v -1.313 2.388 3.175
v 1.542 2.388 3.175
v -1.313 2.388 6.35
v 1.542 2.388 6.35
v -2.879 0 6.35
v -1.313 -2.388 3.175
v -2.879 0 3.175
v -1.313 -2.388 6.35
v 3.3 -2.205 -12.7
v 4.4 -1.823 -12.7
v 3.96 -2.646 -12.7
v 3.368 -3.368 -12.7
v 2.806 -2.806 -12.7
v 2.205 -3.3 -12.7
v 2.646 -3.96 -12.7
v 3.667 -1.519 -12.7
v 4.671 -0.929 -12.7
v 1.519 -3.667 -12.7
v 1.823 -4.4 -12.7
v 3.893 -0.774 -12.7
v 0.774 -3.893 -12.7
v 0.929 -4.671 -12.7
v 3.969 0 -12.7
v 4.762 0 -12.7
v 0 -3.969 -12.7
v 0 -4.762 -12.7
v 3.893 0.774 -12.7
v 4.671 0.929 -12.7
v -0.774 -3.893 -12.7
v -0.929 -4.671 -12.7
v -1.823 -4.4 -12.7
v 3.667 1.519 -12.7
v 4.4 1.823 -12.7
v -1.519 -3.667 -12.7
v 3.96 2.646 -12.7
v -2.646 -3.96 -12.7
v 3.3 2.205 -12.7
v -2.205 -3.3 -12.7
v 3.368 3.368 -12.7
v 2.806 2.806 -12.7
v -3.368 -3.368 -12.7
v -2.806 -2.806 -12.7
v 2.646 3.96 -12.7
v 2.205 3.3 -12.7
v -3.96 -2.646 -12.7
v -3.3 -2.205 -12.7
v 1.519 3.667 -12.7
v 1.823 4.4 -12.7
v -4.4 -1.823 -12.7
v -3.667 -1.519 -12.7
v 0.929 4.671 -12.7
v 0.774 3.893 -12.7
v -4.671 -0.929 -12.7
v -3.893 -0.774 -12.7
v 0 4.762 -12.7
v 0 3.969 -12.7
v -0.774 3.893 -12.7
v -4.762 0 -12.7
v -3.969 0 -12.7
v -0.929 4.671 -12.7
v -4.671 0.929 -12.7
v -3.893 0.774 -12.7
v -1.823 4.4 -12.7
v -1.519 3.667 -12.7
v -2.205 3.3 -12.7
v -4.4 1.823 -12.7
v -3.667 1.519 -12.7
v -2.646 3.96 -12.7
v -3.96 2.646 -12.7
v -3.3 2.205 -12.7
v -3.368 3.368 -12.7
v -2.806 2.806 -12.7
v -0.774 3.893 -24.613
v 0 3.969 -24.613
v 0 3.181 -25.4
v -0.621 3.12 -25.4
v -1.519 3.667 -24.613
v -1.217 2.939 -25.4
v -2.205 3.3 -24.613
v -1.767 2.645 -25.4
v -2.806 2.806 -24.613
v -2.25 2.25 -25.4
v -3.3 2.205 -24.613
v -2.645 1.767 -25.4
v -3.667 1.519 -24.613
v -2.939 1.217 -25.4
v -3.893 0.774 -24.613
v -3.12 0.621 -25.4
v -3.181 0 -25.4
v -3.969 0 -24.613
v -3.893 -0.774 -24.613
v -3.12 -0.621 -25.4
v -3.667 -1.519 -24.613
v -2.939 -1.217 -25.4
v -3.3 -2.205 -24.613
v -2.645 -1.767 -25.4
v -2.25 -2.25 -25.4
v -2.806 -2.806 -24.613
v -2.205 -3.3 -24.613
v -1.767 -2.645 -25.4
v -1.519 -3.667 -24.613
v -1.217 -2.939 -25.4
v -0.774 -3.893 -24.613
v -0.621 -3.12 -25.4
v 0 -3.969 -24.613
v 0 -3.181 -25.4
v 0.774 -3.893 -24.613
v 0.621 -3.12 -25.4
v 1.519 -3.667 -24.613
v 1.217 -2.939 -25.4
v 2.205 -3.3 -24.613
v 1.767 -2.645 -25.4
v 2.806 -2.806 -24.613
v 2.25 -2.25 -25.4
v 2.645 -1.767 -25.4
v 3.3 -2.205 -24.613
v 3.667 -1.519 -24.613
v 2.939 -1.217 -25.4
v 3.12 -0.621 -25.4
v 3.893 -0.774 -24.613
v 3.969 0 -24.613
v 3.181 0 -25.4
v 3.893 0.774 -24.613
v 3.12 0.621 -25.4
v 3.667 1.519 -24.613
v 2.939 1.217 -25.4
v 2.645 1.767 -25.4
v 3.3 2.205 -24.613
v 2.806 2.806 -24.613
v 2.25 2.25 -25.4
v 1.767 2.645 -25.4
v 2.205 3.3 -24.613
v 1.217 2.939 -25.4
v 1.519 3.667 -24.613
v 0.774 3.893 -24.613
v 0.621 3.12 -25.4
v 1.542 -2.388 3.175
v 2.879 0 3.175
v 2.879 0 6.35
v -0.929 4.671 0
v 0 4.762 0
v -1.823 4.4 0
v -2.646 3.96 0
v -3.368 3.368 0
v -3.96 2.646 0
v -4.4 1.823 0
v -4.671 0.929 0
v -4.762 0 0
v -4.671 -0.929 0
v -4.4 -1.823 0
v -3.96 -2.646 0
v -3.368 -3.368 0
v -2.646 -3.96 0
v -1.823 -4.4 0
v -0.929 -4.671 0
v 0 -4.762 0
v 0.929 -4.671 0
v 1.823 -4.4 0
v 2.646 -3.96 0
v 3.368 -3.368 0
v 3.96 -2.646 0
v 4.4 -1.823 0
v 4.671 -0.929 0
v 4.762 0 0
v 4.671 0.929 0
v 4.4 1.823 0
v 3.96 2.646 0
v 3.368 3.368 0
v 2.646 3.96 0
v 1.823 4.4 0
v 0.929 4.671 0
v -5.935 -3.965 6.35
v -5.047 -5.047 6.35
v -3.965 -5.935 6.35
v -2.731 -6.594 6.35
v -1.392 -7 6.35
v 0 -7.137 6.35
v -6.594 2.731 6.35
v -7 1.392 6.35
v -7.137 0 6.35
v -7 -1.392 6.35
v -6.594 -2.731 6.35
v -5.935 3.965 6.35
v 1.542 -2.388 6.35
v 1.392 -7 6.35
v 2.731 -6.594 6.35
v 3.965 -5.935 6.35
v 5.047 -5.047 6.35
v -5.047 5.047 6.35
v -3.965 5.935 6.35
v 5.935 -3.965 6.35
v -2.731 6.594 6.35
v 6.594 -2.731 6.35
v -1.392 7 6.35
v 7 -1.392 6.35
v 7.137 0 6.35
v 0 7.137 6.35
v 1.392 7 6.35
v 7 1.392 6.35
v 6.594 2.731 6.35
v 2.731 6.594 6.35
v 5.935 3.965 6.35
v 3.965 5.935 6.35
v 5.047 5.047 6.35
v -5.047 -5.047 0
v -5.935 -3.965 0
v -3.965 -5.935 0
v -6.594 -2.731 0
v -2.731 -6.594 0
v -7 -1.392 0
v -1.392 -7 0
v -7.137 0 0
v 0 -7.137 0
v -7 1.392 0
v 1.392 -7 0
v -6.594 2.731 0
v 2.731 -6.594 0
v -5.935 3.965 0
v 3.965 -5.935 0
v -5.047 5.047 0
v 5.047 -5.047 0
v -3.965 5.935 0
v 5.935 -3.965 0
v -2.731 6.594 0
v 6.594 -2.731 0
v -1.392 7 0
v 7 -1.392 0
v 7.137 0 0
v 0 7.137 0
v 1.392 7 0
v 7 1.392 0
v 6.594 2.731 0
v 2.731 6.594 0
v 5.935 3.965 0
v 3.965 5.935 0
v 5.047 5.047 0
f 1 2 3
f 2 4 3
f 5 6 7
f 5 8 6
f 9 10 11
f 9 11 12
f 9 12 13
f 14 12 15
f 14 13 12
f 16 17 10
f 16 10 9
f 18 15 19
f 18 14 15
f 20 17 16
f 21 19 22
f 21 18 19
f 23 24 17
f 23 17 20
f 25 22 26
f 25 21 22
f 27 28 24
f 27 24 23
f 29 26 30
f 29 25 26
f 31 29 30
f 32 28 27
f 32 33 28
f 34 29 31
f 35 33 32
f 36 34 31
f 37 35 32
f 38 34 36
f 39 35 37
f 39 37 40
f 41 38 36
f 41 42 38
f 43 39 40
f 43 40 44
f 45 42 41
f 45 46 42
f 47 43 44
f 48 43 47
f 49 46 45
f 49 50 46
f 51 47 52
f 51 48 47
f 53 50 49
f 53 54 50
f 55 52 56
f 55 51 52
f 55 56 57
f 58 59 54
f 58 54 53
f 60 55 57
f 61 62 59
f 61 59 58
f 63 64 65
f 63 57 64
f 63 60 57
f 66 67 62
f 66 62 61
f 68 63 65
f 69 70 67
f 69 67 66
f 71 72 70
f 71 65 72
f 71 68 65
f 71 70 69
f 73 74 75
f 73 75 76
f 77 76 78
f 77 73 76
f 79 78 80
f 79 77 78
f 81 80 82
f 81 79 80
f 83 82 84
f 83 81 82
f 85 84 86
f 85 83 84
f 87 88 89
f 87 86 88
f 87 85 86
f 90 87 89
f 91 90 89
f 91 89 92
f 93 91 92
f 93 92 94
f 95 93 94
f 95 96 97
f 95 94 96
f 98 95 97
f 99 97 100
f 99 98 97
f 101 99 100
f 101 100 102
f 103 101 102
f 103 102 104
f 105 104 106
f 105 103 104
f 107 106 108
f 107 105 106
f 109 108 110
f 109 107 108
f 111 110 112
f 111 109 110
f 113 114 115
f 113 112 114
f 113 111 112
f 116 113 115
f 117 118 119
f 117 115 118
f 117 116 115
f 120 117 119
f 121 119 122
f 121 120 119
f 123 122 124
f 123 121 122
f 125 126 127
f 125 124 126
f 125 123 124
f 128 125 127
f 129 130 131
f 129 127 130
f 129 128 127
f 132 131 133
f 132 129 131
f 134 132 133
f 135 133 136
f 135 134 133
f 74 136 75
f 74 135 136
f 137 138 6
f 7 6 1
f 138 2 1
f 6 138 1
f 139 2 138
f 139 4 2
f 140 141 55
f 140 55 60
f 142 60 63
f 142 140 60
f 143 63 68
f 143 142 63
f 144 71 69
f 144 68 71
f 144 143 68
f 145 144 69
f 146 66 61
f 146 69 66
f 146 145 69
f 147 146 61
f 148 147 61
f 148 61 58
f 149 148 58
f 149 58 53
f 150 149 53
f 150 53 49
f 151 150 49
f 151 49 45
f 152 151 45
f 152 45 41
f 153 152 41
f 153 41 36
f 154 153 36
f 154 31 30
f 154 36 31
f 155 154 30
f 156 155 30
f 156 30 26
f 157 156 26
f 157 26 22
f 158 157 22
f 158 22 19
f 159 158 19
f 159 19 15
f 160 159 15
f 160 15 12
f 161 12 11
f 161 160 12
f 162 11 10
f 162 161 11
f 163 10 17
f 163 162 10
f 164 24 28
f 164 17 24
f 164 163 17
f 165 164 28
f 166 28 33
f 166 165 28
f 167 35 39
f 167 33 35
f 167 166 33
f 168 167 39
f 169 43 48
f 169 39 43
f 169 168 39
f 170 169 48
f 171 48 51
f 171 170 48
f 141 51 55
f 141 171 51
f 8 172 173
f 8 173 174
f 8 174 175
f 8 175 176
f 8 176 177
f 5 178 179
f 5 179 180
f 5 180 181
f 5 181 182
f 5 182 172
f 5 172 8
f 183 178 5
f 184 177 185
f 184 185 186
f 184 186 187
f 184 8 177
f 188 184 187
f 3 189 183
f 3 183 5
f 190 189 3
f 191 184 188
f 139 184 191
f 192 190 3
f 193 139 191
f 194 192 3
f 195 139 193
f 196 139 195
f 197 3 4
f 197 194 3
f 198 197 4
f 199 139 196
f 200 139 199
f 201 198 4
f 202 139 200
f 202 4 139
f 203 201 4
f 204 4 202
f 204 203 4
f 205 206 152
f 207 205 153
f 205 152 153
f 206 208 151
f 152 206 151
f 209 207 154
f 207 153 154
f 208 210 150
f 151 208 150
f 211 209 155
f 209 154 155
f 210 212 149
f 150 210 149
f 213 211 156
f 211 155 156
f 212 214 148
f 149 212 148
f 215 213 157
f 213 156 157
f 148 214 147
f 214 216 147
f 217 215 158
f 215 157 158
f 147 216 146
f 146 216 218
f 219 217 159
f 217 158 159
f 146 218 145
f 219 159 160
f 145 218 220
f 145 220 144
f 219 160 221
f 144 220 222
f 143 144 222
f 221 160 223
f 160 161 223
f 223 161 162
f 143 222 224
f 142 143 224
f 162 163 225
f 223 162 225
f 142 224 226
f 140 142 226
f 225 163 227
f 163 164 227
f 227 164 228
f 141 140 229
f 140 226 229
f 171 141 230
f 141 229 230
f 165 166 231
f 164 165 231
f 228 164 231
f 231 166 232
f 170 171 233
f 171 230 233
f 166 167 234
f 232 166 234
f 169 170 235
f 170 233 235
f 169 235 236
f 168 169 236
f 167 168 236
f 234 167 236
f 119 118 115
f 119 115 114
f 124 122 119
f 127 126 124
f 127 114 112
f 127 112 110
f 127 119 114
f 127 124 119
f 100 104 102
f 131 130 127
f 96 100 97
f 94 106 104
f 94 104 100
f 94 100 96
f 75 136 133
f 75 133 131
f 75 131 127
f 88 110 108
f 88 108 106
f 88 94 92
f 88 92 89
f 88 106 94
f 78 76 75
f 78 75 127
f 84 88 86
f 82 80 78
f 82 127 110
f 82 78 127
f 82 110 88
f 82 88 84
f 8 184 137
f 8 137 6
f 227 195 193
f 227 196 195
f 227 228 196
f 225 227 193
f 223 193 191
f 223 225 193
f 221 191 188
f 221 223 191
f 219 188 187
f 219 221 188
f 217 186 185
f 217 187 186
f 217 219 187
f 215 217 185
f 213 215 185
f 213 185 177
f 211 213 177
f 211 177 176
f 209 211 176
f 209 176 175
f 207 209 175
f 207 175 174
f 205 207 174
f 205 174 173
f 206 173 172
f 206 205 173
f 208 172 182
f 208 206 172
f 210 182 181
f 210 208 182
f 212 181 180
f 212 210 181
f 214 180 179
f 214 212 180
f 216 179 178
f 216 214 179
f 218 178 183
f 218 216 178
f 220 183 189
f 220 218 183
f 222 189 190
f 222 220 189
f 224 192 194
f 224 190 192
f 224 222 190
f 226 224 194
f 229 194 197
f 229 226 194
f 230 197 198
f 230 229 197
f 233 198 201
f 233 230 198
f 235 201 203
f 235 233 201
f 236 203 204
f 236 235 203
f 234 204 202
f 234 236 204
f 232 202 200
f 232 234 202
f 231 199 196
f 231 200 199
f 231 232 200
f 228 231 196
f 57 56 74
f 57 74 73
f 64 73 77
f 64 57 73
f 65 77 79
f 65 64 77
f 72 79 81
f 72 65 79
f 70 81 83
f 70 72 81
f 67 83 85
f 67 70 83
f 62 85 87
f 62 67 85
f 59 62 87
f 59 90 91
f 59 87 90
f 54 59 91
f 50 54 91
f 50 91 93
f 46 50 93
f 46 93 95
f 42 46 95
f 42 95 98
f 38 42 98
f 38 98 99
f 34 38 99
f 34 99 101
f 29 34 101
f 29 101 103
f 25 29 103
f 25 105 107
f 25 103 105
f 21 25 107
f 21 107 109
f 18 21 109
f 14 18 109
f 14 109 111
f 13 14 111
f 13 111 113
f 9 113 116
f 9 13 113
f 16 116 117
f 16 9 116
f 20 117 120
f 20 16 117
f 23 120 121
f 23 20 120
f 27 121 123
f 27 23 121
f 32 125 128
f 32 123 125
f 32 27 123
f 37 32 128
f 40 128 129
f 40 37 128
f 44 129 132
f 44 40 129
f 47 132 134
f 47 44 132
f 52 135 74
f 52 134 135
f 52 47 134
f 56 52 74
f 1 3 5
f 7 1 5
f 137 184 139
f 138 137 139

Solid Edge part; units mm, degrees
sketch "Sketch1" plane through (0, 0, 0) normal (0, 0, 1) x (1, 0, 0)
  circle A0 centre (0, 0) radius 7.1374
  dimension "D1" = 14.2748
extrude "Protrusion1" add sketch "Sketch1" along normal blind 6.35
sketch "Sketch2" plane through (0, 0, 0) normal (0, 0, -1) x (0, 1, 0)
  circle A0 centre (0, 0) radius 4.7625
  dimension "D1" = 9.525
extrude "Protrusion2" add sketch "Sketch2" along normal blind 12.7
sketch "Sketch3" plane through (0, 0, -12.7) normal (0, 0, -1) x (0, 1, 0)
  circle A0 centre (0, 0) radius 3.9688
  dimension "D1" = 7.9375
extrude "Protrusion3" add sketch "Sketch3" along normal blind 12.7
sketch "Sketch4" plane through (0, 0, 6.35) normal (0, 0, 1) x (0, 1, 0)
  line L0 (-2.3876, 1.3131) -> (0, 2.8792)
  line L1 (-2.3876, -1.5424) -> (-2.3876, 1.3131)
  line L2 (-2.3876, -1.5424) -> (0, -2.8792)
  line L3 (2.3876, -1.5424) -> (0, -2.8792)
  line L4 (2.3876, -1.5424) -> (2.3876, 1.3131)
  line L5 (2.3876, 1.3131) -> (0, 2.8792)
  dimension "D1" = 4.7752
extrude "Cutout1" cut sketch "Sketch4" against normal blind 3.175
chamfer "Chamfer1" distance 0.7874 angle 45 1 edges at (0, -3.9688, -25.4)
properties part number "24103079"
